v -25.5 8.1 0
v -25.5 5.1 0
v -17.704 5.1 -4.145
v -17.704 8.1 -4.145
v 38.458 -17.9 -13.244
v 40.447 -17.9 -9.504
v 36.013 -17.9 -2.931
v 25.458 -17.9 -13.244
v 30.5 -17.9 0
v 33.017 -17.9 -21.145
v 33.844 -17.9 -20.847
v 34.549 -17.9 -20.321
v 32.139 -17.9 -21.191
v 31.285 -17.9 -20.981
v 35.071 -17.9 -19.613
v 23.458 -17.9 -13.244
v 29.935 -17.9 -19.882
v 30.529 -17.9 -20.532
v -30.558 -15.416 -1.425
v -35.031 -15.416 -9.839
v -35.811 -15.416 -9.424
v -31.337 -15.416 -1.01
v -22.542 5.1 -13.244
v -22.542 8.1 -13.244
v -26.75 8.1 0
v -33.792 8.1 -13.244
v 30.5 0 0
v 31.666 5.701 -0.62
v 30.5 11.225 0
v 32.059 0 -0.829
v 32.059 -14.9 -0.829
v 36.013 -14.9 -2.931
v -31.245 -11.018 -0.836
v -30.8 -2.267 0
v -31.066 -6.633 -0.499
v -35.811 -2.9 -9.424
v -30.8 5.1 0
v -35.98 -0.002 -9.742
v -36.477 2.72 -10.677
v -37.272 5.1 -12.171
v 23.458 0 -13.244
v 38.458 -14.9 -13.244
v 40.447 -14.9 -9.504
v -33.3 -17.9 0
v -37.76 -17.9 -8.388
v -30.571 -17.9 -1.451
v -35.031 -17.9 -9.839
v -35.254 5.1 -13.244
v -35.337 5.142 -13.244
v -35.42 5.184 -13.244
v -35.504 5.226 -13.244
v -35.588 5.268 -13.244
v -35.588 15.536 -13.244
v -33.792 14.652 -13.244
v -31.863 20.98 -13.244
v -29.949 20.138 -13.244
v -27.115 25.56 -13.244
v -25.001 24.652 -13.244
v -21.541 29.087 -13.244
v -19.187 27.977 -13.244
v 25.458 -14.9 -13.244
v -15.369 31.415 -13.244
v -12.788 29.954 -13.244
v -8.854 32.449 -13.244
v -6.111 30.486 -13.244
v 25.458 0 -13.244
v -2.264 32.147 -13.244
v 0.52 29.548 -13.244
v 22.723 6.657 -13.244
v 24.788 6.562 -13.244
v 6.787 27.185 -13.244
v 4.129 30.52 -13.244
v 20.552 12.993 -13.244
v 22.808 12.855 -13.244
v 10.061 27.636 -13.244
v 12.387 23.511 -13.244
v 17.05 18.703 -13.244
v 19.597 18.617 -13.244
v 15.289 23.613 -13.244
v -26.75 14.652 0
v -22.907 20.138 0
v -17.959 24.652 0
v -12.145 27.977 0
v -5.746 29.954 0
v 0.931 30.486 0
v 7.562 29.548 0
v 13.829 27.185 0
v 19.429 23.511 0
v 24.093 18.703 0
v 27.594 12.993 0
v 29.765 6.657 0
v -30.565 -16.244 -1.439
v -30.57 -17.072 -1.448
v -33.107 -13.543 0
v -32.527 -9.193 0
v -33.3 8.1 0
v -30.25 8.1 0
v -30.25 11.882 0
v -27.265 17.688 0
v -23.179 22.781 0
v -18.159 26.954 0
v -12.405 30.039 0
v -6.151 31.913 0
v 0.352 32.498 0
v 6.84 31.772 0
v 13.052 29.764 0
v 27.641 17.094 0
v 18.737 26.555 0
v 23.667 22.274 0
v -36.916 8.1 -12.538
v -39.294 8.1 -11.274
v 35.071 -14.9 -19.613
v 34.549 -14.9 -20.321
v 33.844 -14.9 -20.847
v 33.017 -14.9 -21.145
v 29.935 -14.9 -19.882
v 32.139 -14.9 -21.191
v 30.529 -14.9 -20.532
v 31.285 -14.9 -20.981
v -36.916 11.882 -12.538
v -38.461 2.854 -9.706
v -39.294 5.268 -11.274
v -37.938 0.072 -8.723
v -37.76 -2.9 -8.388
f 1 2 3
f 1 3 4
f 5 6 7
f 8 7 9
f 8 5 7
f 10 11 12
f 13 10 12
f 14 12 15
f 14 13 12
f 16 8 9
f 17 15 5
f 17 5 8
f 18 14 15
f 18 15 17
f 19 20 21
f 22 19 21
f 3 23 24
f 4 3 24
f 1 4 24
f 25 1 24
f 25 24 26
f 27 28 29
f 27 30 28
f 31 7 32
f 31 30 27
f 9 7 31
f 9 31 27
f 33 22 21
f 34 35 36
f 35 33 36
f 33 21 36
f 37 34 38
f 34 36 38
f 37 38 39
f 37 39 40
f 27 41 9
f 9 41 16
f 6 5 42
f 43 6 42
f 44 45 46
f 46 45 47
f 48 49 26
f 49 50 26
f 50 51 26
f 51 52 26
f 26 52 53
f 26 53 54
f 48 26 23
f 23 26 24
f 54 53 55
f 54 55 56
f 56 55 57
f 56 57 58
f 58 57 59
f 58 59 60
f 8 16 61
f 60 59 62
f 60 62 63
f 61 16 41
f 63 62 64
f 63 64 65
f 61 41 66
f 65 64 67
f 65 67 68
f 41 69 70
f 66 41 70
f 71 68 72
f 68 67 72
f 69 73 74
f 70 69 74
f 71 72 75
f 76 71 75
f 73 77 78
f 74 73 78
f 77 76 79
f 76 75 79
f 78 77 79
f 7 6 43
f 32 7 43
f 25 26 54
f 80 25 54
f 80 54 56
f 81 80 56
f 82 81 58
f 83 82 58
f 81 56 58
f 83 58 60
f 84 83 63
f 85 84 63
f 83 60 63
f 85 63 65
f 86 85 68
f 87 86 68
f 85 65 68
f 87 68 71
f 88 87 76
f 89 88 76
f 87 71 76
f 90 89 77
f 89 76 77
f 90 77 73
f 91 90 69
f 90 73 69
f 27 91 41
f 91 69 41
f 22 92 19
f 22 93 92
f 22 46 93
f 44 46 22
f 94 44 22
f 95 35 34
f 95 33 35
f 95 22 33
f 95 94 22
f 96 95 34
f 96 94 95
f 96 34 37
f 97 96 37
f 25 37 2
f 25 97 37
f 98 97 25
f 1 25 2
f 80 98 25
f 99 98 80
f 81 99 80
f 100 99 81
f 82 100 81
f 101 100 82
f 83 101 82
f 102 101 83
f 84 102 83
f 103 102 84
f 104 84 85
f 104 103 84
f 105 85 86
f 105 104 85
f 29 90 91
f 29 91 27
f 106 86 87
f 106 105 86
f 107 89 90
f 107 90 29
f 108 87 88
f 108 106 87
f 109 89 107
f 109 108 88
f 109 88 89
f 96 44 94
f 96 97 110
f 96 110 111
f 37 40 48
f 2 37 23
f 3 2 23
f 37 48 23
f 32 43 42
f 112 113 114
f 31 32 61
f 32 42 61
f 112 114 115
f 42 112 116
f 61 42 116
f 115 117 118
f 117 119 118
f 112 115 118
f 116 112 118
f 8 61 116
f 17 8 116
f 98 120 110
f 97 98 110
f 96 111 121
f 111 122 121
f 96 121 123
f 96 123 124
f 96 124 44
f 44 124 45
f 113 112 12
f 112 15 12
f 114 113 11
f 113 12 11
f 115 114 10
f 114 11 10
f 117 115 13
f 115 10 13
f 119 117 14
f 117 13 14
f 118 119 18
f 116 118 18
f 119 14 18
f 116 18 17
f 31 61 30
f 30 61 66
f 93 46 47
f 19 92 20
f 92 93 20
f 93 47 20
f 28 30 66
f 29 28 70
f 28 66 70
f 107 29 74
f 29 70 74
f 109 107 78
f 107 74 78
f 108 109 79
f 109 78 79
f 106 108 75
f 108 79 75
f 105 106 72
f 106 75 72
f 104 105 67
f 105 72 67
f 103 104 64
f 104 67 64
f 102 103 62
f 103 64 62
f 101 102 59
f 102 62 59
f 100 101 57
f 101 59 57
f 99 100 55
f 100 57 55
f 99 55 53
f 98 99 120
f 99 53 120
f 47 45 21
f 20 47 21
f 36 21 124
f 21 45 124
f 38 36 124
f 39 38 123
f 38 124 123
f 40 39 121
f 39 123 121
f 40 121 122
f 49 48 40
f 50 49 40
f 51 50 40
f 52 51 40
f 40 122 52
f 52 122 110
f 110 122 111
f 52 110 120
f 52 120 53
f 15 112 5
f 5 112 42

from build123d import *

# Parameters (mm, degrees)
CORTE_EXTRUS_O1_DEPTH      = 51.4
CORTE_EXTRUS_O2_DEPTH      = 73.874980511
CHANFRO1_SIZE              = 10
CHANFRO1_SIZE2             = 4.694715628
ESBO_O6_W                  = 5.368395338
ESBO_O6_H                  = 18.334195556
CORTE_EXTRUS_O3_DEPTH      = 5
CORTE_EXTRUS_O3_DEPTH_BACK = 5
RESSALTO_EXTRUS_O2_DEPTH   = 3
CHANFRO2_SIZE              = 7
CHANFRO2_SIZE2             = 3.721966022
FILETE2_R                  = 3


with BuildPart() as part:
    # Varredura2: sweep along a path in Esboço2
    with BuildLine(Plane(origin=(0, 0, 0), x_dir=(1, 0, 0), z_dir=(0, 1, 0))) as varredura2_path:
        Line((0, 0), (-7.042073442, 13.244213893))
    # Esboço1<3> → Varredura2 (sweep)
    with BuildSketch(Plane.XY):
        with BuildLine():
            Line((30.5, 0), (30.5, -17.9))
            Line((30.5, -17.9), (45.5, -17.9))
            Line((45.5, -17.9), (45.5, -14.9))
            Line((45.5, -14.9), (32.5, -14.9))
            Line((32.5, -14.9), (32.5, 0))
            ThreePointArc((32.5, 0), (6.046693311, 31.932546093), (-30.25, 11.882234638))
            Line((-30.25, 11.882234638), (-30.25, 8.1))
            Line((-30.25, 8.1), (-33.3, 8.1))
            Line((-33.3, 8.1), (-33.3, -17.9))
            Line((-33.3, -17.9), (-30.8, -17.9))
            Line((-30.8, -17.9), (-29.8, -17.9))
            Line((-29.8, -17.9), (-29.8, -15.416139266))
            Line((-29.8, -15.416139266), (-30.8, -15.416139266))
            Line((-30.8, -15.416139266), (-30.8, 5.1))
            Line((-30.8, 5.1), (-26.75, 5.1))
            Line((-26.75, 5.1), (-15.5, 5.1))
            Line((-15.5, 5.1), (-15.5, 8.1))
            Line((-15.5, 8.1), (-26.75, 8.1))
            Line((-26.75, 8.1), (-26.75, 14.652218262))
            ThreePointArc((-26.75, 14.652218262), (7.562241731, 29.547631039), (30.5, 0))
        make_face()
    sweep(path=varredura2_path.line)

    # Esboço4 → Corte-extrusão1 (cut, through all)
    with BuildSketch(Plane.XZ.offset(17.9)):
        Polygon((42.193946776, -6.217781794), (30.5, 0), (45.5, 0), align=None)
    extrude(amount=-CORTE_EXTRUS_O1_DEPTH, mode=Mode.SUBTRACT)

    # Esboço5 → Corte-extrusão2 (cut, through all)
    with BuildSketch(Plane(origin=(-25.960561843, 0, 13.803475583), x_dir=(0.469471563, 0, 0.882947593), z_dir=(-0.882947593, 0, 0.469471563))):
        with BuildLine():
            Line((-30.633403041, -17.9), (-25.133403041, -17.9))
            Line((-25.133403041, -17.9), (-25.133403041, -2.9))
            ThreePointArc((-25.133403041, -2.9), (-26.599119213, 2.806356105), (-30.633403041, 7.1))
            Line((-30.633403041, 7.1), (-30.633403041, -17.9))
        make_face()
        with BuildLine():
            Line((-13.16947903, 4.679780509), (-13.16947903, -17.9))
            Line((-13.16947903, -17.9), (-15.633403041, -17.9))
            ThreePointArc((-15.633403041, -17.9), (-15.015599199, -6.543092307), (-13.16947903, 4.679780509))
        make_face()
    extrude(amount=-CORTE_EXTRUS_O2_DEPTH, mode=Mode.SUBTRACT)

    # Chanfro1
    chanfro1_edges = [part.edges().sort_by_distance(p)[0] for p in [
        (-15.5, 6.6, 0),
    ]]
    chanfro1_side = [part.faces().sort_by_distance(p)[0] for p in [
        (-23.15, 5.913055964, 0),
    ]]
    chamfer(chanfro1_edges, length=CHANFRO1_SIZE, length2=CHANFRO1_SIZE2, reference=chanfro1_side[0])

    # Esboço6 → Corte-extrusão3 (cut, two sides)
    with BuildSketch(Plane(origin=(-24.011570713, 0, 12.767178617), x_dir=(-0.469471563, 0, -0.882947593), z_dir=(0.882947593, 0, -0.469471563))) as corte_extrus_o3_sk:
        with Locations((31.085712443, 8.557015368)):
            Rectangle(ESBO_O6_W, ESBO_O6_H)
    extrude(amount=CORTE_EXTRUS_O3_DEPTH, mode=Mode.SUBTRACT)
    extrude(corte_extrus_o3_sk.sketch, amount=-CORTE_EXTRUS_O3_DEPTH_BACK, mode=Mode.SUBTRACT)

    # Esboço7 → Ressalto-extrusão2 (add)
    with BuildSketch(Plane(origin=(0, -14.9, 0), x_dir=(1, 0, 0), z_dir=(0, 1, 0))):
        Polygon((25.457926558, 13.244213893), (32.727434303, 24.021702336), (38.457926558, 13.244213893), align=None)
    extrude(amount=-RESSALTO_EXTRUS_O2_DEPTH)

    # Chanfro2
    chanfro2_edges = [part.edges().sort_by_distance(p)[0] for p in [
        (42.193946776, -16.4, -6.217781794),
    ]]
    chanfro2_side = [part.faces().sort_by_distance(p)[0] for p in [
        (36.346973388, -17.580051063, -3.108890897),
    ]]
    chamfer(chanfro2_edges, length=CHANFRO2_SIZE, length2=CHANFRO2_SIZE2, reference=chanfro2_side[0])

    # Filete2
    filete2_edges = [part.edges().sort_by_distance(p)[0] for p in [
        (32.727434303, -16.4, -24.021702336),
    ]]
    fillet(filete2_edges, radius=FILETE2_R)


solid = part.part
